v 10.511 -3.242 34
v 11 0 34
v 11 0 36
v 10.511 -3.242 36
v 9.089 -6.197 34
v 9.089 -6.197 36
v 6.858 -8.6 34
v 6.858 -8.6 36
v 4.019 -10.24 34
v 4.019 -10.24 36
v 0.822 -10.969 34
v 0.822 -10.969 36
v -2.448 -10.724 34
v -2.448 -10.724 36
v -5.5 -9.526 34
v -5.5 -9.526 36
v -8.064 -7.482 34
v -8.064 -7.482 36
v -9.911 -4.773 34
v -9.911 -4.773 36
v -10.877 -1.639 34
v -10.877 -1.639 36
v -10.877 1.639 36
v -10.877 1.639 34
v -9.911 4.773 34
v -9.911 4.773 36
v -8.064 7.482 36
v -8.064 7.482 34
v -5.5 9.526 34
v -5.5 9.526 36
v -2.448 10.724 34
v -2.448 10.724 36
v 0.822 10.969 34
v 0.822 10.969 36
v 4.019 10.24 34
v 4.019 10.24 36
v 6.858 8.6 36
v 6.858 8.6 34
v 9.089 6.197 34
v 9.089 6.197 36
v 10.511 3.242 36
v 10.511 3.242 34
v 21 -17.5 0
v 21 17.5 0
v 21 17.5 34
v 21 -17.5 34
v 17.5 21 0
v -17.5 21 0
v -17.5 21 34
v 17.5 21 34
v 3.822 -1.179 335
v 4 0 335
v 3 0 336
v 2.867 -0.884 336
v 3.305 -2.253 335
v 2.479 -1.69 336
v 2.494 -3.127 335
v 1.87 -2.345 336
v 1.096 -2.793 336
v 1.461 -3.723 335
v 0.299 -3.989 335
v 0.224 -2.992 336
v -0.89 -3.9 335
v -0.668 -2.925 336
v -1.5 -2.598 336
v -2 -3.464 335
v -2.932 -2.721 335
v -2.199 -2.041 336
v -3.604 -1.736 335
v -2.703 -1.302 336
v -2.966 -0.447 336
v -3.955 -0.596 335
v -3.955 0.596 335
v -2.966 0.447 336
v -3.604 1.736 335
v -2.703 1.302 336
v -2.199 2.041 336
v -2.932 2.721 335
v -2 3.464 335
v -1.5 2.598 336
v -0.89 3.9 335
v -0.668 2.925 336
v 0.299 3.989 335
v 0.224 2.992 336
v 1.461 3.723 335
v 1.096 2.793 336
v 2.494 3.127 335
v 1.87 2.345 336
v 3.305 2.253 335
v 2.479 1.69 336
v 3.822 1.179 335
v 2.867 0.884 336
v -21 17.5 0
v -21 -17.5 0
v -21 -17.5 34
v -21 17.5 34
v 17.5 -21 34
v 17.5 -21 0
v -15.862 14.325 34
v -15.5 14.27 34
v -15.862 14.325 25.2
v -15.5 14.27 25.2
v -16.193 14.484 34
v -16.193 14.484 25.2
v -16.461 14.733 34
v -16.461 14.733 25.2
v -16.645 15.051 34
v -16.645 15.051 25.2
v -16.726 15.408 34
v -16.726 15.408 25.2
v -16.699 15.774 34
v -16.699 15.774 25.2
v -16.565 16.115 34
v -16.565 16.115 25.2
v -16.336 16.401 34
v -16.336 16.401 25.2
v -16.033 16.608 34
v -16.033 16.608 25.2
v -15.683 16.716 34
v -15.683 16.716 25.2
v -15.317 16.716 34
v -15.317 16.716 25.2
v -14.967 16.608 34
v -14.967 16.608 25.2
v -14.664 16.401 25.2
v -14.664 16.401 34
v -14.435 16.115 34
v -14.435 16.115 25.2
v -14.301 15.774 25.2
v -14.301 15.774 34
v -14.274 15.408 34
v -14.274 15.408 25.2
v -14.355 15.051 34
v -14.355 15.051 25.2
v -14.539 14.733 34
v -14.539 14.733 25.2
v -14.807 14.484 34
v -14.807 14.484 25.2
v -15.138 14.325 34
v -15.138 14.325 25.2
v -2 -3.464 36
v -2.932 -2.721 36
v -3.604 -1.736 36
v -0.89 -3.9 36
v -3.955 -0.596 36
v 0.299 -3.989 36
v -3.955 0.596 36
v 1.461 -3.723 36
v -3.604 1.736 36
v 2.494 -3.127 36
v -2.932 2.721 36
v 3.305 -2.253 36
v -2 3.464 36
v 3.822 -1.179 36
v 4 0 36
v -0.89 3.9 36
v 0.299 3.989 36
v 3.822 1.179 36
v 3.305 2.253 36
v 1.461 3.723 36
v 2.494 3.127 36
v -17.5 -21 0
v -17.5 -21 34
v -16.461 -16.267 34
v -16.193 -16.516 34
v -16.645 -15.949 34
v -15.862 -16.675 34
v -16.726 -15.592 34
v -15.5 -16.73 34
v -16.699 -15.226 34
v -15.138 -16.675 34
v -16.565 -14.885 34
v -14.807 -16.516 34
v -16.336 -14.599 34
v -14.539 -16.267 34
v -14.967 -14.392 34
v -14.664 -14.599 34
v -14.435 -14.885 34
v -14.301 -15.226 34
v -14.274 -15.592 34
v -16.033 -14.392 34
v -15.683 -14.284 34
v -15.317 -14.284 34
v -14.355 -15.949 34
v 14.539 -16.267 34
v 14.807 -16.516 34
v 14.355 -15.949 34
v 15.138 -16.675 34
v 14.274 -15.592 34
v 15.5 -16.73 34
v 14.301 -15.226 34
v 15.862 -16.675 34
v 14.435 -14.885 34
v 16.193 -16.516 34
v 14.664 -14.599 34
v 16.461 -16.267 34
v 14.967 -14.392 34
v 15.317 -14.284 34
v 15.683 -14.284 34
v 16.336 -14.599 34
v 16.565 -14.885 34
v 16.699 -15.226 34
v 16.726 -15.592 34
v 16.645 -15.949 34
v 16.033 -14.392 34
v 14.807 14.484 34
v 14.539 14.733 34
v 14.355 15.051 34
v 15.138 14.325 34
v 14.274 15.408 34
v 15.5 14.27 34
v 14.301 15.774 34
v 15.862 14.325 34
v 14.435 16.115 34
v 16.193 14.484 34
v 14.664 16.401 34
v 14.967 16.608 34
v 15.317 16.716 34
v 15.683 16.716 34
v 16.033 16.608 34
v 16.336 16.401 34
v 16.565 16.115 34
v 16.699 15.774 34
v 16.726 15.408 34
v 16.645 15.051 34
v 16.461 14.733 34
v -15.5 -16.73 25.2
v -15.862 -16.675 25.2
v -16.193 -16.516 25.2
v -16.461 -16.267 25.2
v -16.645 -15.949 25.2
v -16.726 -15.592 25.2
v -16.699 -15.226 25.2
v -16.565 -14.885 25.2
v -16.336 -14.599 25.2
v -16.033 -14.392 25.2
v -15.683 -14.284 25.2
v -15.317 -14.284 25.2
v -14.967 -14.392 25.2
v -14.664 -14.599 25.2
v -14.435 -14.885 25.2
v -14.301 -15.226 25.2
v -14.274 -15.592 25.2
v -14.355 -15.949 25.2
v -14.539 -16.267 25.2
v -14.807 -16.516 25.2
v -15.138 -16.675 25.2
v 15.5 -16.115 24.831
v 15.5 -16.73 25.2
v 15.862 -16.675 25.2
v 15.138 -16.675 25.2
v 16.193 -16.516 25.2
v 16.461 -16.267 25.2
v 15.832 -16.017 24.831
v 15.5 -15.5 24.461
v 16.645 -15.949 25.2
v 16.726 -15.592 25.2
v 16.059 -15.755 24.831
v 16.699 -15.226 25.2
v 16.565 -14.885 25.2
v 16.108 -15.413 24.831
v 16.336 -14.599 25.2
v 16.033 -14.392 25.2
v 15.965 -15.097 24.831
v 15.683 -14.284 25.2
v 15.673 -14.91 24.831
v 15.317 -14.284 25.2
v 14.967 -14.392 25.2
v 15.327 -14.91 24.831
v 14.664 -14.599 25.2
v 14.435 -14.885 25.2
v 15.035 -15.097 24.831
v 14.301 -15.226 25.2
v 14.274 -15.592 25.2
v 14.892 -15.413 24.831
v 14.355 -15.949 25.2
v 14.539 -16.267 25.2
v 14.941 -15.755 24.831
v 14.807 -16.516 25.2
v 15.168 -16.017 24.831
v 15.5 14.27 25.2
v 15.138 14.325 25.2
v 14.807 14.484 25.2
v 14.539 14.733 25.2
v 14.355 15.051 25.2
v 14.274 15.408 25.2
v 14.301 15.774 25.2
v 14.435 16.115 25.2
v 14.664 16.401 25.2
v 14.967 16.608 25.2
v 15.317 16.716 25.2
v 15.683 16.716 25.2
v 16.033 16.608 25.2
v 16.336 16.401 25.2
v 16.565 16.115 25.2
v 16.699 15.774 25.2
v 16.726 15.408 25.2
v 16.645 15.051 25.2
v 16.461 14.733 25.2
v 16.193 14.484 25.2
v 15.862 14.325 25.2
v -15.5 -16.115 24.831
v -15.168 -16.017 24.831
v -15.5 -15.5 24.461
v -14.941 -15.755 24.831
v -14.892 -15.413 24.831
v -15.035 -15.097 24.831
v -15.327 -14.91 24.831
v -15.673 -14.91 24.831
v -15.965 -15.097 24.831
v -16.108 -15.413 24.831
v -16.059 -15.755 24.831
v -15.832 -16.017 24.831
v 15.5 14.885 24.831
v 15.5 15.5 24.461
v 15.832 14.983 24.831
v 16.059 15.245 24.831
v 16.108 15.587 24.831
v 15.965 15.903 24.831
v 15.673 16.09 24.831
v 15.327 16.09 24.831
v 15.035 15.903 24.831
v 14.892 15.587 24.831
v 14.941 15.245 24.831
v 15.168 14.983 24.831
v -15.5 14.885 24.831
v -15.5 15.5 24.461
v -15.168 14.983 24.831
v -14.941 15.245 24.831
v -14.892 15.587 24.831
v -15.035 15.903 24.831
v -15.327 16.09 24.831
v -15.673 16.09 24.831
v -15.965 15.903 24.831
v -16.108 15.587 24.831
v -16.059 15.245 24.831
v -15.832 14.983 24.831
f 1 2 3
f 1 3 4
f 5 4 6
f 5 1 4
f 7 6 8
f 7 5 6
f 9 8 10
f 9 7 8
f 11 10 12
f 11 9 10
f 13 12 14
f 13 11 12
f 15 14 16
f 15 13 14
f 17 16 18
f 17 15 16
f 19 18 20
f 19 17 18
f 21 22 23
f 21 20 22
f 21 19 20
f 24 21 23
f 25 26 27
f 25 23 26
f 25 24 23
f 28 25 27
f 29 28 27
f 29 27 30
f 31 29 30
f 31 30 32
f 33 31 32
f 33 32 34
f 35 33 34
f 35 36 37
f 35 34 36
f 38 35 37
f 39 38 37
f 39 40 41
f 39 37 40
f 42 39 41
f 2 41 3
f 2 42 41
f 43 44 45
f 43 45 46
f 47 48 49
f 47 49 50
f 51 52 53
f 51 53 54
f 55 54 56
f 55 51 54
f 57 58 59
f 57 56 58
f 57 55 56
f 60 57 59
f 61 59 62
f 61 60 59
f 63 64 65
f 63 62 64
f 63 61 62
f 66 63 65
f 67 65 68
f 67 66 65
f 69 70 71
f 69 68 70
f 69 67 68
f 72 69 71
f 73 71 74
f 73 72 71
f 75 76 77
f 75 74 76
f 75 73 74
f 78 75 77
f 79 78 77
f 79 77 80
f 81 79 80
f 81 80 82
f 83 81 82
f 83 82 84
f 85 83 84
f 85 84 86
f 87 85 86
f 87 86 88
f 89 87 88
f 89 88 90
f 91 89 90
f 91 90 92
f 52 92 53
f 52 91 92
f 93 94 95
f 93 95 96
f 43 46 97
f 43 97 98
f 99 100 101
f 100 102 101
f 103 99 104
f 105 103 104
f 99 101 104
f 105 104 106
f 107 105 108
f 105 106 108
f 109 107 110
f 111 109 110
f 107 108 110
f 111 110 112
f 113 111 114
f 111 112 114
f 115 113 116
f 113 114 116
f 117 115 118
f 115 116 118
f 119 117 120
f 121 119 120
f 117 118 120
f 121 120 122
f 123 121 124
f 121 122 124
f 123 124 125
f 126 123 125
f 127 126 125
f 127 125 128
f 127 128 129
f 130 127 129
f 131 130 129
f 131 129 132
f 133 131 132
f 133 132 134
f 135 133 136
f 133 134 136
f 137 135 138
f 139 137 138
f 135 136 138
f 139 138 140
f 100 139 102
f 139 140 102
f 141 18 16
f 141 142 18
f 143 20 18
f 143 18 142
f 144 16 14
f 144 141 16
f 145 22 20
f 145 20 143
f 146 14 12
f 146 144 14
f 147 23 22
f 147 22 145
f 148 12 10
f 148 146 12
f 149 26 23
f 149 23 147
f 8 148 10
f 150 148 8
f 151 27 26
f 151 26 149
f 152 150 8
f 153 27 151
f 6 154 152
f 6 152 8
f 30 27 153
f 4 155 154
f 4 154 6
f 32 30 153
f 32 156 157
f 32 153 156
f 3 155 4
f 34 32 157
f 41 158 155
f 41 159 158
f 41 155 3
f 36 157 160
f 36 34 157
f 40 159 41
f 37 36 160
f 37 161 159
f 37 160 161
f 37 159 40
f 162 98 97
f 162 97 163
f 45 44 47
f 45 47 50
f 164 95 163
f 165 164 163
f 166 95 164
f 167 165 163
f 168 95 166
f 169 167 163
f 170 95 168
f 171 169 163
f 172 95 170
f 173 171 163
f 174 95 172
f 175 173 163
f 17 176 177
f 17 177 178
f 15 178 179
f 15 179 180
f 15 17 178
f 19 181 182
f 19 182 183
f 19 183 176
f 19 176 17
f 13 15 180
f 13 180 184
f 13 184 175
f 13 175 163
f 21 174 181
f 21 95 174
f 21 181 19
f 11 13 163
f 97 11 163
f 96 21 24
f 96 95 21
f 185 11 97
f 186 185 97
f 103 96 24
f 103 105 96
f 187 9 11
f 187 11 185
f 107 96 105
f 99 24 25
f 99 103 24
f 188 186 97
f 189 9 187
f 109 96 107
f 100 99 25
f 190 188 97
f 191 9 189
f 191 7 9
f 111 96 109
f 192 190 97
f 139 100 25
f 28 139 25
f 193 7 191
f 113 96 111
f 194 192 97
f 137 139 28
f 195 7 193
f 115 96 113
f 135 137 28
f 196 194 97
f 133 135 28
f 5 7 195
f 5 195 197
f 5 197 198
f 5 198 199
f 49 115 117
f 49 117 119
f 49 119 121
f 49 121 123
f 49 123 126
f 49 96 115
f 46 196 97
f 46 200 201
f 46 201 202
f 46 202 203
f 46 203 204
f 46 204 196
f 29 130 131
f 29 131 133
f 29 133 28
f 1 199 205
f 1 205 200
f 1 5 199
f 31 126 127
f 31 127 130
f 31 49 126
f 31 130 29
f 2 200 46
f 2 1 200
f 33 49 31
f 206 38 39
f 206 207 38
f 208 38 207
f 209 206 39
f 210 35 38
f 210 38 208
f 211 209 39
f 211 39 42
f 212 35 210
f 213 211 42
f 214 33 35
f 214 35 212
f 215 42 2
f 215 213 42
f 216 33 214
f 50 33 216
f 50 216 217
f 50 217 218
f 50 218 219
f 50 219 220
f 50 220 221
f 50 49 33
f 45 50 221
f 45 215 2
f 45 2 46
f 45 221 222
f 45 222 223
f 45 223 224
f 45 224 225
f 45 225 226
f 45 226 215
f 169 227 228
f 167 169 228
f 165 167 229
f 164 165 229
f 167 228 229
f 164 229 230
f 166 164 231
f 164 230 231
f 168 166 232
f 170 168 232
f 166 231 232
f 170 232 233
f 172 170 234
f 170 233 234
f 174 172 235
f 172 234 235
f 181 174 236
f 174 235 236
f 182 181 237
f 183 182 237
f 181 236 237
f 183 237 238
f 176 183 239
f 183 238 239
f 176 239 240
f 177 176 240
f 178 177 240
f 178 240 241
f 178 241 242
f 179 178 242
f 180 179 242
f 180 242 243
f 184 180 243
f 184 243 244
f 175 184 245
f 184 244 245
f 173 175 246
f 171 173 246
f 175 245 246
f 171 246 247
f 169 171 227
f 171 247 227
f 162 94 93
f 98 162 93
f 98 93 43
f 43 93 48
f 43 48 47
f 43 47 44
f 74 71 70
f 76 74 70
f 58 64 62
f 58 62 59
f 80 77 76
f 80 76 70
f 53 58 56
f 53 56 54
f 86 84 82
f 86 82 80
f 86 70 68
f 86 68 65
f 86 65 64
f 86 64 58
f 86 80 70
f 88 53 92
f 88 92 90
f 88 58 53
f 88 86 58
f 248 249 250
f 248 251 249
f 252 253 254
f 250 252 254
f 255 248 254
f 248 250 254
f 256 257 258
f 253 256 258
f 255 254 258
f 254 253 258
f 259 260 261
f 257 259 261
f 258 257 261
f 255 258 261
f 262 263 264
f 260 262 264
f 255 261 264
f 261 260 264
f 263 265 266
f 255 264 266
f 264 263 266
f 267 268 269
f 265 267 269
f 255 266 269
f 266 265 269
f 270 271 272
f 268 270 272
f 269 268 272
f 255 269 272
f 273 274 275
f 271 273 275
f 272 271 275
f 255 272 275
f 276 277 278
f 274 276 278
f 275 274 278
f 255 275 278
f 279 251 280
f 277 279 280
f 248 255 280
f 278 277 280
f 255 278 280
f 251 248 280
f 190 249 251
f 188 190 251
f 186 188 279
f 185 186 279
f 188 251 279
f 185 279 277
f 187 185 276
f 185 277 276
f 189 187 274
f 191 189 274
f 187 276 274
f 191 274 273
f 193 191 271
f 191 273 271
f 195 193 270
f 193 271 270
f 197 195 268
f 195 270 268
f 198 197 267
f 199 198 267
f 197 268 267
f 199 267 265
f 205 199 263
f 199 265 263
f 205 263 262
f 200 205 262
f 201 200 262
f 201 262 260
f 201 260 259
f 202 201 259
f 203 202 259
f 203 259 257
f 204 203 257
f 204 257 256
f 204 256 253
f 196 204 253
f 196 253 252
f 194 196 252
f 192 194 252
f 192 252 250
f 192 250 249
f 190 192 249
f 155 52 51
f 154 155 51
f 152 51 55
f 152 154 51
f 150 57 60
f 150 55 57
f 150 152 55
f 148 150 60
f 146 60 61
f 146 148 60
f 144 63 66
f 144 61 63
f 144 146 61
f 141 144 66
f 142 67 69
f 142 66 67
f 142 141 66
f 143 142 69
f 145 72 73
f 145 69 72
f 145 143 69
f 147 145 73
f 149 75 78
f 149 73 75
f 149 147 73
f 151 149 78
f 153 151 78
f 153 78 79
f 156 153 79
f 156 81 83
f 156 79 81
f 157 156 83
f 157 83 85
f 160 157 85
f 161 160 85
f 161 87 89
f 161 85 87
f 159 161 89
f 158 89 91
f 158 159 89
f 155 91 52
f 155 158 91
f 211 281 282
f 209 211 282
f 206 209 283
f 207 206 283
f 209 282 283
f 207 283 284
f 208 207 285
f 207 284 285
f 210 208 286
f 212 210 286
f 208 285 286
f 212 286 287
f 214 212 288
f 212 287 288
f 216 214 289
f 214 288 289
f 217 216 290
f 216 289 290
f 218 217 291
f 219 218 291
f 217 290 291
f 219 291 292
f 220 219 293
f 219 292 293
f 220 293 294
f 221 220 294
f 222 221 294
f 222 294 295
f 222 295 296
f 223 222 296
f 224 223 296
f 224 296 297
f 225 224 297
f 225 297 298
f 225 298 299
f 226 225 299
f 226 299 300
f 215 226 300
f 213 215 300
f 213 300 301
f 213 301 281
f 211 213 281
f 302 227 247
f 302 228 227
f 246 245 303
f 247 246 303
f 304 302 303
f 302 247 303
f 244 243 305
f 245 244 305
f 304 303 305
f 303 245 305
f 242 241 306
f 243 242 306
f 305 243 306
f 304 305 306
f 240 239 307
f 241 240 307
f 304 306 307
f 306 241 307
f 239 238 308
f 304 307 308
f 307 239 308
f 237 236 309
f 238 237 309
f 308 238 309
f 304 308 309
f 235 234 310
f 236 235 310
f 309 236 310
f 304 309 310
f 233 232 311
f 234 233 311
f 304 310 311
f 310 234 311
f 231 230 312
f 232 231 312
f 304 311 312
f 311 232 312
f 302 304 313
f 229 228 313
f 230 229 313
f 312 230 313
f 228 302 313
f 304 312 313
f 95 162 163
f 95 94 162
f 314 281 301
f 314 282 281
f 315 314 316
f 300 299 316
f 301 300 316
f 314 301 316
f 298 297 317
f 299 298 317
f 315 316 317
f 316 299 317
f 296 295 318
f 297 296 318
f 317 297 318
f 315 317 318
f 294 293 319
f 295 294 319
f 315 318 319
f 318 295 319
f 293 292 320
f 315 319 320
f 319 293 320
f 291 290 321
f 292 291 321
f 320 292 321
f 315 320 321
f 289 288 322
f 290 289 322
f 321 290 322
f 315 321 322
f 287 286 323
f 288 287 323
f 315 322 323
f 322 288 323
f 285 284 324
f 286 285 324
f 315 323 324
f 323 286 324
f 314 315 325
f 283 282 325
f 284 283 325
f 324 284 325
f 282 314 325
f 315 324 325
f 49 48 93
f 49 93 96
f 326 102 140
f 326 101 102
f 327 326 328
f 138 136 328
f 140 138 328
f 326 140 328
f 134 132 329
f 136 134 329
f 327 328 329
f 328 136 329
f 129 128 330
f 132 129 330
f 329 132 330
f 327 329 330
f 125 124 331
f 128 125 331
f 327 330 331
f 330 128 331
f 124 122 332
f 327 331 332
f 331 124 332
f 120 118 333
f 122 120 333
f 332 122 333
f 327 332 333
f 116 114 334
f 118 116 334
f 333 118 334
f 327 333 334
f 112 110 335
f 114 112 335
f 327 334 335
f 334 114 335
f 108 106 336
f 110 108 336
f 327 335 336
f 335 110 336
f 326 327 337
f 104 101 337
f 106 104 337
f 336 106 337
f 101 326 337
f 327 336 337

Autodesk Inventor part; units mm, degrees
ref_plane "YZ Plane" through (0, 0, 0) normal (1, 0, 0) x (0, 1, 0)
ref_plane "XZ Plane" through (0, 0, 0) normal (0, 1, 0) x (-1, 0, 0)
ref_plane "XY Plane" through (0, 0, 0) normal (0, 0, 1) x (1, 0, 0)
sketch "Sketch1" plane through (0, 0, 0) normal (0, 0, 1) x (1, 0, 0)
  line L0 (21, -21) -> (-21, -21)
  line L1 (-21, -21) -> (-21, 21)
  line L2 (-21, 21) -> (21, 21)
  line L3 (21, 21) -> (21, -21)
  line L4 (21, -21) -> (-21, 21) construction
  line L5 (-21, -21) -> (21, 21) construction
  point P0 (0, 0)
  dimension "d0" = 42
extrude "Extrusion1" add sketch "Sketch1" along normal blind 34
chamfer "Chamfer1" distance 3.5 angle 45 4 edges at (-21, 21, 17) (21, 21, 17) (21, -21, 17) (-21, -21, 17)
sketch "Sketch2" plane through (0, 0, 34) normal (0, 0, 1) x (1, 0, 0)
  circle A0 centre (0, 0) radius 11
  dimension "d6" = 22
extrude "Extrusion2" add sketch "Sketch2" along normal blind 2
sketch "Sketch3" plane through (0, 0, 36) normal (0, 0, 1) x (1, 0, 0)
  circle A0 centre (0, 0) radius 4
  dimension "d9" = 8
extrude "Extrusion3" add sketch "Sketch3" along normal blind 300
thread "Thread1" size "M8x1.25" class "6g" standard "ANSI Metric M Profile" full length
chamfer "Chamfer2" distance 1 angle 45 1 edges at (-4, 0, 336)
sketch "Sketch4" plane through (0, 0, 34) normal (0, 0, 1) x (1, 0, 0)
  line L0 (-17.5, -21) -> (17.5, -21) projected
  line L1 (17.5, 21) -> (-17.5, 21) projected
  line L2 (-21, 17.5) -> (-21, -17.5) projected
  point P0 (0, 0)
  point P1 (-15.5, 15.5)
  point P2 (-15.5, -15.5)
  point P3 (15.5, -15.5)
  point P4 (15.5, 15.5)
  dimension "d17" = 31
  dimension "d18" = 31
  dimension "d19" = 42
  dimension "d21" = 5.5
  dimension "d22" = 5.5
hole "Hole1" at (-15.5, 15.5, 34) at (-15.5, -15.5, 34) at (15.5, -15.5, 34) at (15.5, 15.5, 34) direction (0, 0, -1) diameter 2.459 depth 8.8 tip angle 118 thread size "M3x0.5" class "6H" standard "ISO Metric profile"
equation "\"d21\" = -0.5 * d18 + 0.5 * d19"
equation "\"d22\" = -0.5 * d18 + 0.5 * d19"
properties part number "Motor_Z" material "Steel, Alloy"
